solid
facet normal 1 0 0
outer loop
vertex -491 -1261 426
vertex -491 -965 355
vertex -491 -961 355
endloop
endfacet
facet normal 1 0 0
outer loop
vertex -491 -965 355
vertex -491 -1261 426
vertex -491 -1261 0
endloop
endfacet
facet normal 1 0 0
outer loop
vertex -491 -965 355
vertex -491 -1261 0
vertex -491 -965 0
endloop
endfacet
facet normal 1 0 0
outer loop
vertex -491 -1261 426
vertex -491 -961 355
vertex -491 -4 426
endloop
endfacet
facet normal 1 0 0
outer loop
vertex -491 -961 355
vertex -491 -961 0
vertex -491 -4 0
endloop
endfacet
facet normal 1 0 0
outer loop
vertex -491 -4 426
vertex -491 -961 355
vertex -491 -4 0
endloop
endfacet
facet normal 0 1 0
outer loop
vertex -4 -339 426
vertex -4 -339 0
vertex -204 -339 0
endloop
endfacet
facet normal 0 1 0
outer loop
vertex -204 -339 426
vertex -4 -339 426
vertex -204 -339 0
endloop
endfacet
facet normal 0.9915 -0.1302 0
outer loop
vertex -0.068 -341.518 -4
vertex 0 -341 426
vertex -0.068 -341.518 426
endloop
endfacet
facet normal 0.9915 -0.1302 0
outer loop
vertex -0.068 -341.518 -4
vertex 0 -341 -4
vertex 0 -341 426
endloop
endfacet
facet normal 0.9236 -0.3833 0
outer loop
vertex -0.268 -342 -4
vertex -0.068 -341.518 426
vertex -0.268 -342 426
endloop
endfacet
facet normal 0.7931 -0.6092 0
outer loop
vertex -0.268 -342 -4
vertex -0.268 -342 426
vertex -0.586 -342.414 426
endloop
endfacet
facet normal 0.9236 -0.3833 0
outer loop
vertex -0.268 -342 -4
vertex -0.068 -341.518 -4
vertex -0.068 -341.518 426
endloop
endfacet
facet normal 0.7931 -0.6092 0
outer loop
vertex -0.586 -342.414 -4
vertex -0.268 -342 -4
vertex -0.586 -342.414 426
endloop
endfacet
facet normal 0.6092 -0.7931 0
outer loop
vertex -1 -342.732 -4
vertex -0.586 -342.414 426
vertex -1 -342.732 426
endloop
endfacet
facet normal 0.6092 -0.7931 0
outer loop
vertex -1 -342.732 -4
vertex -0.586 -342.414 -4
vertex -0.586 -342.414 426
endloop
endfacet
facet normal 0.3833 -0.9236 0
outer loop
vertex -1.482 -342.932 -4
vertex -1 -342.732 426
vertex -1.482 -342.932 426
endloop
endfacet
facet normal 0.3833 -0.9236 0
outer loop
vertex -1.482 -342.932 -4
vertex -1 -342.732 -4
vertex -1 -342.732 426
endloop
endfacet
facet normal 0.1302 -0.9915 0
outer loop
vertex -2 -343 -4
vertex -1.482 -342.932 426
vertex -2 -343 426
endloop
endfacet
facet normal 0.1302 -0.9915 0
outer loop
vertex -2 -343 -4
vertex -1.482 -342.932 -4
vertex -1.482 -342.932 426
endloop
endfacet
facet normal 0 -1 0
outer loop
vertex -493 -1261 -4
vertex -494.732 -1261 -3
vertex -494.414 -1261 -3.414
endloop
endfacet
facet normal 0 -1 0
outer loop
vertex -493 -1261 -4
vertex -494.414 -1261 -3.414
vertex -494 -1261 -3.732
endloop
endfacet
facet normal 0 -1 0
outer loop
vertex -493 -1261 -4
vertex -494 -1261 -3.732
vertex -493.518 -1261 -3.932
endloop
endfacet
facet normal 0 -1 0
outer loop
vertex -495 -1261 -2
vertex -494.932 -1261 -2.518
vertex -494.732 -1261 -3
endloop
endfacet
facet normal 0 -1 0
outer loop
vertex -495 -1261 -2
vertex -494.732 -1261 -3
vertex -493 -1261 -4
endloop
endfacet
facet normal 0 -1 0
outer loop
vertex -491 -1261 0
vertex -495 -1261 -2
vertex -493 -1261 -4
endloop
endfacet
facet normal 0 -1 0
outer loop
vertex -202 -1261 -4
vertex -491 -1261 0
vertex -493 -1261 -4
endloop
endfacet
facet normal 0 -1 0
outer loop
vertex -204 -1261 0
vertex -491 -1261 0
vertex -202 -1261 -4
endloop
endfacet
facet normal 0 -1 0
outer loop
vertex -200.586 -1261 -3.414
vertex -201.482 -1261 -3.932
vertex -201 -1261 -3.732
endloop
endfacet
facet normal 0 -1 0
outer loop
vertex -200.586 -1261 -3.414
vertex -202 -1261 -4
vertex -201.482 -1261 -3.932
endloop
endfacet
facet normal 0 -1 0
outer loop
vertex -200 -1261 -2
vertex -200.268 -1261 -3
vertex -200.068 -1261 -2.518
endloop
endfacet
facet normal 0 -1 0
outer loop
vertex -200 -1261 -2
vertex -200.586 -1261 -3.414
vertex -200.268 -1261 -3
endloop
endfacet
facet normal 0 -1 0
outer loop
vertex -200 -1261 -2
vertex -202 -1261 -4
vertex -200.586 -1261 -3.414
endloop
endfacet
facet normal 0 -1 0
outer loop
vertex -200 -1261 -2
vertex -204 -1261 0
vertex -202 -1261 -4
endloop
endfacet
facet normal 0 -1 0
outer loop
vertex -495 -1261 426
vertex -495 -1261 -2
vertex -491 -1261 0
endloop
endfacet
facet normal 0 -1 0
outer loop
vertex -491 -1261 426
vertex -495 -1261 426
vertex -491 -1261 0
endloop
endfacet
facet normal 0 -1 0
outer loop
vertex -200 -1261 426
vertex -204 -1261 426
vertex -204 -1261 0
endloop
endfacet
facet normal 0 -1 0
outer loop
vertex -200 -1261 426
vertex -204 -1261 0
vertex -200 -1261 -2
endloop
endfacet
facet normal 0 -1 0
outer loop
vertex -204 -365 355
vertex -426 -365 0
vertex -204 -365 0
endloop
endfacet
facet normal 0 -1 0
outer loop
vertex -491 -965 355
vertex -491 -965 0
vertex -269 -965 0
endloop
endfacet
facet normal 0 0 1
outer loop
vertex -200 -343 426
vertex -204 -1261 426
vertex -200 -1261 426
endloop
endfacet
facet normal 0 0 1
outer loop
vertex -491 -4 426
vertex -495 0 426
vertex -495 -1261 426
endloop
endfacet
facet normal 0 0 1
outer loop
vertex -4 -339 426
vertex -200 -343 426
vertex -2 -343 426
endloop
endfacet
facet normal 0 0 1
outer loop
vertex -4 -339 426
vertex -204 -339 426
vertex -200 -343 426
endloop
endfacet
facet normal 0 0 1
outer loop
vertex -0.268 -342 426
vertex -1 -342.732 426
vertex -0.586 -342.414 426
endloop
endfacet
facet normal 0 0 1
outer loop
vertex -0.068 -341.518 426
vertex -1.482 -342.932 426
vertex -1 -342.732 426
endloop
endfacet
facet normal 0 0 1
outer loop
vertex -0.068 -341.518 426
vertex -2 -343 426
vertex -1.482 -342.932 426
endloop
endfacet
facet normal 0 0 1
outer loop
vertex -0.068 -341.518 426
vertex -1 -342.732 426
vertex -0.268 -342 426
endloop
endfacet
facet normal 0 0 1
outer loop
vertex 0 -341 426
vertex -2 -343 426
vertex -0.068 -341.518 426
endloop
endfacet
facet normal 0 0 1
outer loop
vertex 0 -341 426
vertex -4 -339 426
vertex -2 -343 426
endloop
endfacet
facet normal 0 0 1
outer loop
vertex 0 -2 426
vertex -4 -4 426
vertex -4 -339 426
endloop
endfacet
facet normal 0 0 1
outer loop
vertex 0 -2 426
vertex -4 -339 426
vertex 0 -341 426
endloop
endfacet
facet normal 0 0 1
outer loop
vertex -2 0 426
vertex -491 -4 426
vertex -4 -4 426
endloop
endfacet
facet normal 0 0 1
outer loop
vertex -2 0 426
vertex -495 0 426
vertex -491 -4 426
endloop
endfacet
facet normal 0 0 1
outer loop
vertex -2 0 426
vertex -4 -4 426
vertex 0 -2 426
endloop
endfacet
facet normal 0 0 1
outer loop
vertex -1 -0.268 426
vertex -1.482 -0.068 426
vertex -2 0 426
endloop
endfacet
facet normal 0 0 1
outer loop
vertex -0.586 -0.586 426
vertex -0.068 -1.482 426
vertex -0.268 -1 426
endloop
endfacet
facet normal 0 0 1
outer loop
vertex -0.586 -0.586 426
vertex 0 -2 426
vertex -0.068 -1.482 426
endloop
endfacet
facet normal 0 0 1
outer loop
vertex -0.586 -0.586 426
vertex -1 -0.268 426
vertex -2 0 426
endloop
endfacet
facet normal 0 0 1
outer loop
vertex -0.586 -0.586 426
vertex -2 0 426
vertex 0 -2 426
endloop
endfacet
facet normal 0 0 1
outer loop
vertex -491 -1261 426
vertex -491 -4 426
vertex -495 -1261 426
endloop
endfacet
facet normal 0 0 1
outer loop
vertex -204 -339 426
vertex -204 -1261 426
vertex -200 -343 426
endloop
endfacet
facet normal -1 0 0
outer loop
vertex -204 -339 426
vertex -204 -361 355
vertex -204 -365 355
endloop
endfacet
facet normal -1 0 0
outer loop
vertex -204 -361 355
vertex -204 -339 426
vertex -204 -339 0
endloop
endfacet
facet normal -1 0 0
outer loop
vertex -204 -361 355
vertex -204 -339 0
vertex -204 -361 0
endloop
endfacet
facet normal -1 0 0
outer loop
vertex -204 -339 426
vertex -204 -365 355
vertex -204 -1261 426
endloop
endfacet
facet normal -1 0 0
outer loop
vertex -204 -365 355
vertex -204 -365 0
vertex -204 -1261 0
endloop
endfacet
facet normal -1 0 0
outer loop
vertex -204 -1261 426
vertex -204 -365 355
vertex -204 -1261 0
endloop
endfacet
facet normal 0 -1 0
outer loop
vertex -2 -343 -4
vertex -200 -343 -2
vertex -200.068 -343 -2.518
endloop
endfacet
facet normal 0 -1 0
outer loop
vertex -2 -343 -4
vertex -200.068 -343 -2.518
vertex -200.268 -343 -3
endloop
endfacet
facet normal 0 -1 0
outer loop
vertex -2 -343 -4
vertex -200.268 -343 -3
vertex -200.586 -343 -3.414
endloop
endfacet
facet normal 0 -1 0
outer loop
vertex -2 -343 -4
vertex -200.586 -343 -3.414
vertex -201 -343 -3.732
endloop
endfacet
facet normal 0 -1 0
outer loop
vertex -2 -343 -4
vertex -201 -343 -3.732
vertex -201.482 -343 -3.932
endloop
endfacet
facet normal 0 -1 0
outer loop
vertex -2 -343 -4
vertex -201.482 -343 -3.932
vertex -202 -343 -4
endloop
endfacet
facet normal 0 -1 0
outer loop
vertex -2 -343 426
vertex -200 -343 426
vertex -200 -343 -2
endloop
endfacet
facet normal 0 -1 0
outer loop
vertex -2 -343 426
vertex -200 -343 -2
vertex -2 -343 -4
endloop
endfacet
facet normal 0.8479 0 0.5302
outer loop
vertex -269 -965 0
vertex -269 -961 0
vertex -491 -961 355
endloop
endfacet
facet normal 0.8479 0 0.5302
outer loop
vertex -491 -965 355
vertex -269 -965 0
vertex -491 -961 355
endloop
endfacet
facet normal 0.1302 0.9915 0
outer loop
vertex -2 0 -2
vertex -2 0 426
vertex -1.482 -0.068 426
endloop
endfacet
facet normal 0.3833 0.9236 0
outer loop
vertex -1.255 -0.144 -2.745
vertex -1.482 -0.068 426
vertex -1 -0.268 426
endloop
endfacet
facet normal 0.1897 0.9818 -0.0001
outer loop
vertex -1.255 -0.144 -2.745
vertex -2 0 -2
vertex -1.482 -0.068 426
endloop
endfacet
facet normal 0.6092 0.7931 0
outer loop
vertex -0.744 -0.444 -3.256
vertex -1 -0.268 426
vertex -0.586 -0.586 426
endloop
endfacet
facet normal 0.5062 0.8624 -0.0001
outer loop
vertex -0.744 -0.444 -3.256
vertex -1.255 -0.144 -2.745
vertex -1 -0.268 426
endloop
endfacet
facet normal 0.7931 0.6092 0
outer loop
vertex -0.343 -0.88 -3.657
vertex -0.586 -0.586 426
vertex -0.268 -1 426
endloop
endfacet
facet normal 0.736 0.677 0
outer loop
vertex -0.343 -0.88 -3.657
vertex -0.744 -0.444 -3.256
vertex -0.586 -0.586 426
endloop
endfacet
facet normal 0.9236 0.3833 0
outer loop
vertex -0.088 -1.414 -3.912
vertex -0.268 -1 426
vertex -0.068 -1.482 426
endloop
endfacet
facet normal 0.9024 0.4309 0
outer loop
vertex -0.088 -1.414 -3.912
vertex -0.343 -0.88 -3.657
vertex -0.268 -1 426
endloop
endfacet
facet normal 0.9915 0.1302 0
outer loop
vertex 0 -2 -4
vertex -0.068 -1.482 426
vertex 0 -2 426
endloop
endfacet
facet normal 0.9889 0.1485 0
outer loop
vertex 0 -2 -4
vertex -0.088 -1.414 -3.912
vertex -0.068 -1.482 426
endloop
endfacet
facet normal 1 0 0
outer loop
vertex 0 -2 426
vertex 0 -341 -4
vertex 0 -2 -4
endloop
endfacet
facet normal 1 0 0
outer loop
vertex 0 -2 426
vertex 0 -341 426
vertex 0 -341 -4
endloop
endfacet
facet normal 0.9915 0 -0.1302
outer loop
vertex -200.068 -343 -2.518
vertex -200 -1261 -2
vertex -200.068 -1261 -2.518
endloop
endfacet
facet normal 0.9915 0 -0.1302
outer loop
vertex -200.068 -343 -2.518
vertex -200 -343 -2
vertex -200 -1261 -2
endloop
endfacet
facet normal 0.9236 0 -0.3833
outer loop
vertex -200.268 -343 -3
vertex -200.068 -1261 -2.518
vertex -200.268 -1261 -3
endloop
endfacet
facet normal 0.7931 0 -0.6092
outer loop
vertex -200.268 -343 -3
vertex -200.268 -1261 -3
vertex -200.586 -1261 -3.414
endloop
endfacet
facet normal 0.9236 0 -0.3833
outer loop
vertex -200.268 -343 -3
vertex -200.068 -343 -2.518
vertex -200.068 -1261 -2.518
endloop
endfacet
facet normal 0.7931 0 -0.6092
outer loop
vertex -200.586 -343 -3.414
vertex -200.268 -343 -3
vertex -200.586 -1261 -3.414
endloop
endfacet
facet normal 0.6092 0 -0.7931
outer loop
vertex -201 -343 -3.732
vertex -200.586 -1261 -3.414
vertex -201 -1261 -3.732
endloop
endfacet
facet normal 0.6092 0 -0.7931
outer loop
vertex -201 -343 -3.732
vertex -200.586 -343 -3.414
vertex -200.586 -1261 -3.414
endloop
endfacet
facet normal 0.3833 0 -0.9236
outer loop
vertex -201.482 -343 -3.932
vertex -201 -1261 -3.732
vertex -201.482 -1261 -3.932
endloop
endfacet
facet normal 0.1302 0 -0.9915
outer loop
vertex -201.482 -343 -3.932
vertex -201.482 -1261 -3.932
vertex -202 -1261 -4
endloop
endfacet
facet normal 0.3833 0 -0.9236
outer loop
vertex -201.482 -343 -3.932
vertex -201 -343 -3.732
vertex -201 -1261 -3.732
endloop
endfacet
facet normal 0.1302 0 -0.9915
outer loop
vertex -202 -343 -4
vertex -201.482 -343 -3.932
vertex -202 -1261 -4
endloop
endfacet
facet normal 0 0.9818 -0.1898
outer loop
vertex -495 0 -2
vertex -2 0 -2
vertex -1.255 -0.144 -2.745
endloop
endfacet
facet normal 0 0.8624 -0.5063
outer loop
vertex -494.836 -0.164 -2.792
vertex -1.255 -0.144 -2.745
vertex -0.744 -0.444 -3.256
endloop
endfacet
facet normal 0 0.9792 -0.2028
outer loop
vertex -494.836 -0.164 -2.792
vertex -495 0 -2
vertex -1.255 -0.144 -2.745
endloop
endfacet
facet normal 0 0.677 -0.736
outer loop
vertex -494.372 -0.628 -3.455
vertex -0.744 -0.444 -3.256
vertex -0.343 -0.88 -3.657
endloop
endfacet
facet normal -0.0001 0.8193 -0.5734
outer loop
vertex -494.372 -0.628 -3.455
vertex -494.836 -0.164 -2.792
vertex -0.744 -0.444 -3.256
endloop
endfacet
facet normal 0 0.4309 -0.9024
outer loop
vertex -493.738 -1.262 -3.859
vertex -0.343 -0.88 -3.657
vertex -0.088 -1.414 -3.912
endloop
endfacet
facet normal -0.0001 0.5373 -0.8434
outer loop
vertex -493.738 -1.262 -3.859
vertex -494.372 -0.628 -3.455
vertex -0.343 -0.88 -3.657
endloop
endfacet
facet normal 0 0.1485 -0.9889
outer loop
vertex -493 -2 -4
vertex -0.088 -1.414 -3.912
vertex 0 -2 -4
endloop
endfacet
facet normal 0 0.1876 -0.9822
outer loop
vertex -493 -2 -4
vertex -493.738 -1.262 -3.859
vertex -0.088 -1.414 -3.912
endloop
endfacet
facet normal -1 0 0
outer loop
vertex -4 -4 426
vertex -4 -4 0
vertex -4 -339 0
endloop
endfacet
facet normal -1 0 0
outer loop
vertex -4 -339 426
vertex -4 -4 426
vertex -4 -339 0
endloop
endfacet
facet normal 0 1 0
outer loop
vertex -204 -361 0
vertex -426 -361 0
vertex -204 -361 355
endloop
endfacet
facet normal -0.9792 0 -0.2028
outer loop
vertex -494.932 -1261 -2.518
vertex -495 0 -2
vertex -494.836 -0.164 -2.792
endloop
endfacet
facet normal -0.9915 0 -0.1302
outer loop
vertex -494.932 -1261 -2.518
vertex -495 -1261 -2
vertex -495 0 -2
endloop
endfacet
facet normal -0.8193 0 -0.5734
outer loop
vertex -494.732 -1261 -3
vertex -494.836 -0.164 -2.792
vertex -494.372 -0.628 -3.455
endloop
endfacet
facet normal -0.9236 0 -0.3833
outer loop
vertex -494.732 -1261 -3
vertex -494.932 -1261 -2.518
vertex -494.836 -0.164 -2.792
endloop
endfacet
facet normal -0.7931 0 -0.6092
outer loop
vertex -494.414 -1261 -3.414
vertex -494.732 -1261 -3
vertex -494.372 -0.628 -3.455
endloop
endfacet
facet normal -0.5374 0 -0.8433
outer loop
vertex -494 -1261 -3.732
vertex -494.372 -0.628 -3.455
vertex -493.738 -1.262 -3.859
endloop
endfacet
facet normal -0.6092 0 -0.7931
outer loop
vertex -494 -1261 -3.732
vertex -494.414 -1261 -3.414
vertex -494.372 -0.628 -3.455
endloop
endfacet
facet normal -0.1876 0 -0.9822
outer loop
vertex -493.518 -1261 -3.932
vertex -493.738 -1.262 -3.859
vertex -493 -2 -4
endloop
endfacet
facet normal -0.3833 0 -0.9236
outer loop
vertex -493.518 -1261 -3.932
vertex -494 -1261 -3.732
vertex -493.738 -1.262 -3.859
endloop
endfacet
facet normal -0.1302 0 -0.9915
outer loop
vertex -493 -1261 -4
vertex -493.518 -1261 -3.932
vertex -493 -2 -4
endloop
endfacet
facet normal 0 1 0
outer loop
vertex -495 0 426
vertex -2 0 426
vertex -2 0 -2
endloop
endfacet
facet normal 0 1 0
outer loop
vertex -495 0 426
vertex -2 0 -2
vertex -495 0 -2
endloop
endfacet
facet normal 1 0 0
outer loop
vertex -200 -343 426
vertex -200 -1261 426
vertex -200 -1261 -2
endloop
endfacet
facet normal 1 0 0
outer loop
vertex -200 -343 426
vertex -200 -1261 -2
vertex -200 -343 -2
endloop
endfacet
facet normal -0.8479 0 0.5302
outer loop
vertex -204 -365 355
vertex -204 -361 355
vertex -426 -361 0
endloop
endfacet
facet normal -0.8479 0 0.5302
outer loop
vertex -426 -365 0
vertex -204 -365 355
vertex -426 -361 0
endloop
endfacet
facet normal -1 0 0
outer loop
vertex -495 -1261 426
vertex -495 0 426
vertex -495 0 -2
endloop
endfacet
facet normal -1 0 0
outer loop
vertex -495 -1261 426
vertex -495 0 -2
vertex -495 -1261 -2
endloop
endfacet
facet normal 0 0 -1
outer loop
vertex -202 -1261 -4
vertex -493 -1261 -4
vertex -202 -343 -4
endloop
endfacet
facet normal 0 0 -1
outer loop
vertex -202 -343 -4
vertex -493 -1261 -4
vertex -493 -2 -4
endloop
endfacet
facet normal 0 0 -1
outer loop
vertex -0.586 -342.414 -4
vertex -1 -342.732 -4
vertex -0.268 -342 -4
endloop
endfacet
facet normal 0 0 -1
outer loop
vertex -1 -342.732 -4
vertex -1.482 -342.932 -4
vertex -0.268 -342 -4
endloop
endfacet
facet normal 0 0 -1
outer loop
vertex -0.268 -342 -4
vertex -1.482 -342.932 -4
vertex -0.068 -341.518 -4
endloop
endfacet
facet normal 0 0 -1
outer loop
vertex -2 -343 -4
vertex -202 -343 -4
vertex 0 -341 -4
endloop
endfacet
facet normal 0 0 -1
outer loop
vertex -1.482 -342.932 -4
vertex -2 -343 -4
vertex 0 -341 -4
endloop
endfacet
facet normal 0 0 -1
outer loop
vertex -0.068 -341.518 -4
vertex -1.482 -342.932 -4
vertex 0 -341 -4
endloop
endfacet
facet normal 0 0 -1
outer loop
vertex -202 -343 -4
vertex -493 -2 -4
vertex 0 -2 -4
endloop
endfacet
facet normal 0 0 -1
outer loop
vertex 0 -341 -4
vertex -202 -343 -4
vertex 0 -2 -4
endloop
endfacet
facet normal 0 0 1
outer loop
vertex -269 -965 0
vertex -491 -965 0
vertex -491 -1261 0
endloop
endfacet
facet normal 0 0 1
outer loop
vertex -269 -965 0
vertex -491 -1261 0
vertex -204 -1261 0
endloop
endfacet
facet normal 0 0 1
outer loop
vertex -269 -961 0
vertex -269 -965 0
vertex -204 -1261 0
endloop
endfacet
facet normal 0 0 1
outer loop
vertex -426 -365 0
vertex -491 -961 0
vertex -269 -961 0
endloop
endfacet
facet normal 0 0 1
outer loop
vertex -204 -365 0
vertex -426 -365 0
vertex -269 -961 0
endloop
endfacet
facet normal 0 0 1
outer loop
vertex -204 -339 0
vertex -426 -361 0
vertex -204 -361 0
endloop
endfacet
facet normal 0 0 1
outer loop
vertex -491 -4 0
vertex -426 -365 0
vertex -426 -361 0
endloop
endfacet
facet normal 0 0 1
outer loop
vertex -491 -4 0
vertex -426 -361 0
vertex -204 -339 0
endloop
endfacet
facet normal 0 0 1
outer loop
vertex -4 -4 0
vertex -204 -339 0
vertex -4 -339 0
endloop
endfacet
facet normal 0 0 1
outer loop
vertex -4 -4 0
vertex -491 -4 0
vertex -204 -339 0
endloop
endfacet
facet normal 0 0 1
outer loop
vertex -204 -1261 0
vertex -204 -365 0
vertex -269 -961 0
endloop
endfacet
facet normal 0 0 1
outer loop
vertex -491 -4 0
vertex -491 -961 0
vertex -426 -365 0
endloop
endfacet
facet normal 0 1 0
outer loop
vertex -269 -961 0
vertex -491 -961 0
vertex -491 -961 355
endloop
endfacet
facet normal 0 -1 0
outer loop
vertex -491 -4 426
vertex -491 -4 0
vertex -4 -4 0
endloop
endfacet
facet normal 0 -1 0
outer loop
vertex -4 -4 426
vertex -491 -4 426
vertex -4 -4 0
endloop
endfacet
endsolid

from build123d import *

# Parameters (mm, degrees)
F1_DEPTH  = 426
F3_DEPTH  = 4
F4_R      = 2
F7_DEPTH  = 4
F10_DEPTH = 4


# Not quite as in the source:
# - a feature names something its author has since deleted; it is built from what else it names


with BuildPart() as f1:
    # F0 (on Top) → F1 (new body)
    with BuildSketch(Plane.XY):
        Polygon((-200, -343), (0, -343), (0, 0), (-495, 0), (-495, -1261), (-491, -1261), (-491, -4), (-4, -4), (-4, -339), (-204, -339), (-204, -1261), (-200, -1261), align=None)
    extrude(amount=F1_DEPTH)

    # F2 (on Top) → F3 (join)
    with BuildSketch(Plane.XY):
        Polygon((0, 0), (-495, 0), (-495, -1261), (-200, -1261), (-200, -343), (0, -343), align=None)
    extrude(amount=-F3_DEPTH)

    # F4
    f4_edges = [f1.edges().sort_by_distance(p)[0] for p in [
        (-200, -802, -4),
        (-495, -630.5, -4),
        (-247.5, 0, -4),
        (0, -343, 211),
        (0, 0, 211),
    ]]
    fillet(f4_edges, radius=F4_R)

    # F6 (on offset) → F7 (join)
    with BuildSketch(Plane.XZ.offset(961)):
        Polygon((-491, 355), (-491, 0), (-269, 0), align=None)
    extrude(amount=F7_DEPTH)

    # F9 (on offset) → F10 (join)
    with BuildSketch(Plane.XZ.offset(361)):
        Polygon((-426, 0), (-204, 0), (-204, 355), align=None)
    extrude(amount=F10_DEPTH)


solid = f1.part
